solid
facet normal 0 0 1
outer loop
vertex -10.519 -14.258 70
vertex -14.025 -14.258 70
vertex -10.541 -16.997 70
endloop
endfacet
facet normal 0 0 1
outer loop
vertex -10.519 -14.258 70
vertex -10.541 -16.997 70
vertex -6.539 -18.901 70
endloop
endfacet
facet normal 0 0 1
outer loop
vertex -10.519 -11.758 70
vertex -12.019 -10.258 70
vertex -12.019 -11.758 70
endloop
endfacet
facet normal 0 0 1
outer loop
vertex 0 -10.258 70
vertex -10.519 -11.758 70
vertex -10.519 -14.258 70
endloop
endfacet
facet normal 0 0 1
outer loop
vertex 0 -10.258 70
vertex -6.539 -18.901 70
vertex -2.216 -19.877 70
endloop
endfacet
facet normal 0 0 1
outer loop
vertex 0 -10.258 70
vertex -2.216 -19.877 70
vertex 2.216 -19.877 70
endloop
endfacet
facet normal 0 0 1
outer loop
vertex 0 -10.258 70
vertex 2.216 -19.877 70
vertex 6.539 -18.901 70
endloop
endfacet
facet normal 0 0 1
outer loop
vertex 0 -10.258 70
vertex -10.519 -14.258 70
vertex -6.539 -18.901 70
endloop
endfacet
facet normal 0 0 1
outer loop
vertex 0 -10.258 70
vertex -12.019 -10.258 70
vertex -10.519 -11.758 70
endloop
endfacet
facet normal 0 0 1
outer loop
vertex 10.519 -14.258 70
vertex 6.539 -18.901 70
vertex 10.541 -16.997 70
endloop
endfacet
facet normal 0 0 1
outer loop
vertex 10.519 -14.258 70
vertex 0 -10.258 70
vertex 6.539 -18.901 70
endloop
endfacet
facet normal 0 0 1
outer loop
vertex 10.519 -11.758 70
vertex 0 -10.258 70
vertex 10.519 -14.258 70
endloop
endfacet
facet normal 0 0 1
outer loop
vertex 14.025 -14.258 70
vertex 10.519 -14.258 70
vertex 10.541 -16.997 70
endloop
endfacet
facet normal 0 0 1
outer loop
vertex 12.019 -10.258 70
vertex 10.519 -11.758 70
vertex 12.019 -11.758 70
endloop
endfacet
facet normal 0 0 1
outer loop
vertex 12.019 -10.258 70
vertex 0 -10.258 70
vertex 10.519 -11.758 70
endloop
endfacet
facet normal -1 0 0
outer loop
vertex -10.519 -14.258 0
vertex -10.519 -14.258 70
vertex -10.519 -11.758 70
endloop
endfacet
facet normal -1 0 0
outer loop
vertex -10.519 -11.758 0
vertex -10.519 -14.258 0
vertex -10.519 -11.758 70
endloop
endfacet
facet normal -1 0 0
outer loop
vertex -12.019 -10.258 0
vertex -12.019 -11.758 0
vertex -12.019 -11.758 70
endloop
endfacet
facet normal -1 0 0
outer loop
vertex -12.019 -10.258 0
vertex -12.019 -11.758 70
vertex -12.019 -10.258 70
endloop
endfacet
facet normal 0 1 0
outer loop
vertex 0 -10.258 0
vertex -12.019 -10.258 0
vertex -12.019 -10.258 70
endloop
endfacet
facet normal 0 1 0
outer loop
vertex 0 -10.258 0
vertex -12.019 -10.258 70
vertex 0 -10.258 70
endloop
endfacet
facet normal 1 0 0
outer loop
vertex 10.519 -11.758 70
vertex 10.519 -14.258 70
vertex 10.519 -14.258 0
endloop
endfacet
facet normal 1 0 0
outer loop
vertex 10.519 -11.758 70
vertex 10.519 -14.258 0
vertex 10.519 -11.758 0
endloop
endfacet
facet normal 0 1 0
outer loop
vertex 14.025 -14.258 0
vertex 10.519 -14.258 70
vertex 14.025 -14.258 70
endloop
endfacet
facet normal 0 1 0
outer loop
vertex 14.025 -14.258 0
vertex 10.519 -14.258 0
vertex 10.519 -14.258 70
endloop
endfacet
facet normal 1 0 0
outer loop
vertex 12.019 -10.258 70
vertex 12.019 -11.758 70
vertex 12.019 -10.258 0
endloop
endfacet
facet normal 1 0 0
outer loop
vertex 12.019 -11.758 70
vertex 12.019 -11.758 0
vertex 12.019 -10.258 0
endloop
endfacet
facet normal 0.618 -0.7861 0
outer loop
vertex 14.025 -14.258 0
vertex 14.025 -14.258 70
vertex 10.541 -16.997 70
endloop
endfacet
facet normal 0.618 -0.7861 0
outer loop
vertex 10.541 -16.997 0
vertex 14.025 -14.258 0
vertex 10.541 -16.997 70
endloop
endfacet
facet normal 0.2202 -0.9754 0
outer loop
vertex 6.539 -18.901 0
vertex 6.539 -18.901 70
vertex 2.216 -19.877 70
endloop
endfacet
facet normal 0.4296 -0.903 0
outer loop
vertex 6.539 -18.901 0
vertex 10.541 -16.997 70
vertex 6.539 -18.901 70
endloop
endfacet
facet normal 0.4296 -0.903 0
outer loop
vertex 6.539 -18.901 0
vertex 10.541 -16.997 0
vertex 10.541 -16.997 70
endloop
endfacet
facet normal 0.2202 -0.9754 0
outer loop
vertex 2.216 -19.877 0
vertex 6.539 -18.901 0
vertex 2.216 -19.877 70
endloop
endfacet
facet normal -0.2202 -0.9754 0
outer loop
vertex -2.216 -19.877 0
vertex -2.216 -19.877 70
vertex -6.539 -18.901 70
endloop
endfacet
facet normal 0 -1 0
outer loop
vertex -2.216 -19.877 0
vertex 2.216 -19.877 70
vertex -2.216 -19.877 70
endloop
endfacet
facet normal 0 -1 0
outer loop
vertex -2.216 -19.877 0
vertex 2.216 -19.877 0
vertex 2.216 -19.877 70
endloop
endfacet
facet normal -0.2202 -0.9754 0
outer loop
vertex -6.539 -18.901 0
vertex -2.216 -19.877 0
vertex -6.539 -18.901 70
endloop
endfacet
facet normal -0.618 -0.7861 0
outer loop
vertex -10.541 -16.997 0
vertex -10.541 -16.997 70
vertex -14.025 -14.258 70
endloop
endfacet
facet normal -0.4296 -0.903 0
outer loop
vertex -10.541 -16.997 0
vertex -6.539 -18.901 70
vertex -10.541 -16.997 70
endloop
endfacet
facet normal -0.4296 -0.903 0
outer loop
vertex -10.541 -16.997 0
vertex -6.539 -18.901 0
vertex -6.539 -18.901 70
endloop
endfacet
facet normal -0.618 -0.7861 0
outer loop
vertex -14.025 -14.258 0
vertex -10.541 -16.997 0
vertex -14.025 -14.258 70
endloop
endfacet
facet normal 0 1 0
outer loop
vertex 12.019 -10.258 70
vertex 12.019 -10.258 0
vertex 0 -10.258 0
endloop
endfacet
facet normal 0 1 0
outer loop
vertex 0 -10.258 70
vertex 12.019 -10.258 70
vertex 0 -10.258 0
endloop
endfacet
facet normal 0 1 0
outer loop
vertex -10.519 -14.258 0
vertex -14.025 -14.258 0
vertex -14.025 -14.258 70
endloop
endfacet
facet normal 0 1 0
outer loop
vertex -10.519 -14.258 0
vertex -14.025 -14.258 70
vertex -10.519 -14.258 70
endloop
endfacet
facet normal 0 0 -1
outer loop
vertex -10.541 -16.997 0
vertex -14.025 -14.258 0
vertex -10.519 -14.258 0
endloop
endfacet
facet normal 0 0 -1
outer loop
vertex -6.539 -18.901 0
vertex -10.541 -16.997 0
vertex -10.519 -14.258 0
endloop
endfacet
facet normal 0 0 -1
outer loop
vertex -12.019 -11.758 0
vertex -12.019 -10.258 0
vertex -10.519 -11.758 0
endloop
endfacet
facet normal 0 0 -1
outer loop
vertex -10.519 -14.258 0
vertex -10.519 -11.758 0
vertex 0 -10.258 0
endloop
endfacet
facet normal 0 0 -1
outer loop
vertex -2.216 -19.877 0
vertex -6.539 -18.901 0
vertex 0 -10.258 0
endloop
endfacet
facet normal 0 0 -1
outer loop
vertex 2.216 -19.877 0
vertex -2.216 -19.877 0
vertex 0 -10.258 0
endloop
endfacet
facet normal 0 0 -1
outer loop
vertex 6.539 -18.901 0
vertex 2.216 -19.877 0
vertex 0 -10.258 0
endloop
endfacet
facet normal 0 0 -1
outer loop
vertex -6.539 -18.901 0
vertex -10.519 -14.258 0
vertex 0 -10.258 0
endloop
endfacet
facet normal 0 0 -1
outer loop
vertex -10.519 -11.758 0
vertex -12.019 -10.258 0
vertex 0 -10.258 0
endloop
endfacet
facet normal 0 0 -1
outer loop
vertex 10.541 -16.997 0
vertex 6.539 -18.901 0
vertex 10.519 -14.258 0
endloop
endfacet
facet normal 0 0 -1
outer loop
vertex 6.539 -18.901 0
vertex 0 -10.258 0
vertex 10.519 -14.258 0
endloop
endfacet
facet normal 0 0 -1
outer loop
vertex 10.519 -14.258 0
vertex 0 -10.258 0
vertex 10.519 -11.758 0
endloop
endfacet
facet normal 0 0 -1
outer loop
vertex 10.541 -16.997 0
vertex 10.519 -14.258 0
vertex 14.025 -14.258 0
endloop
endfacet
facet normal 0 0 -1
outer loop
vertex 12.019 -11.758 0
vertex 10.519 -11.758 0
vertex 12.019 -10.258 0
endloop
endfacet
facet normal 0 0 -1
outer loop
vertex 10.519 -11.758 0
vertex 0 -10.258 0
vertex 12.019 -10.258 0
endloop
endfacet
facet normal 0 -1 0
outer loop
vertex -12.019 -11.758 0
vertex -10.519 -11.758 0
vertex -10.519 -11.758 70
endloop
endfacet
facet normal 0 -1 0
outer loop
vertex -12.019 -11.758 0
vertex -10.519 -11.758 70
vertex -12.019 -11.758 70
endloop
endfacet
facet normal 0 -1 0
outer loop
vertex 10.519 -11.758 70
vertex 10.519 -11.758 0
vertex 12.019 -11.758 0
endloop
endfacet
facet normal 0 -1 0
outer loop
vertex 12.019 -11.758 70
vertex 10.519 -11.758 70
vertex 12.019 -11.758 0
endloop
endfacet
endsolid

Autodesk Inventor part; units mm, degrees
ref_plane "YZ Plane" through (0, 0, 0) normal (1, 0, 0) x (0, 1, 0)
ref_plane "XZ Plane" through (0, 0, 0) normal (0, 1, 0) x (-1, 0, 0)
ref_plane "XY Plane" through (0, 0, 0) normal (0, 0, 1) x (1, 0, 0)
sketch "Эскиз1" plane through (0, 0, 0) normal (0, 0, 1) x (1, 0, 0)
  arc A0 (-14.0253, -14.258) -> (14.0253, -14.258) centre (0, 0) ccw
  line L0 (0, 0) -> (0, -20) construction
  line L1 (-10.5193, -14.258) -> (-10.5193, -11.758)
  line L2 (-10.5193, -11.758) -> (-12.0193, -11.758)
  line L3 (-12.0193, -11.758) -> (-12.0193, -10.258)
  line L4 (-12.0193, -10.258) -> (0, -10.258)
  line L5 (10.5193, -14.258) -> (10.5193, -11.758)
  line L6 (10.5193, -11.758) -> (12.0193, -11.758)
  line L7 (12.0193, -11.758) -> (12.0193, -10.258)
  line L8 (12.0193, -10.258) -> (0, -10.258)
  line L9 (-14.0253, -14.258) -> (-10.5193, -14.258)
  line L10 (10.5193, -14.258) -> (14.0253, -14.258)
  dimension "d0" = 40
  dimension "d2" = 2.5
  dimension "d3" = 1.5
  dimension "d4" = 1.5
  dimension "d5" = 3.506
extrude "Выдавливание1" add sketch "Эскиз1" along normal blind 70
properties part number "cap"
